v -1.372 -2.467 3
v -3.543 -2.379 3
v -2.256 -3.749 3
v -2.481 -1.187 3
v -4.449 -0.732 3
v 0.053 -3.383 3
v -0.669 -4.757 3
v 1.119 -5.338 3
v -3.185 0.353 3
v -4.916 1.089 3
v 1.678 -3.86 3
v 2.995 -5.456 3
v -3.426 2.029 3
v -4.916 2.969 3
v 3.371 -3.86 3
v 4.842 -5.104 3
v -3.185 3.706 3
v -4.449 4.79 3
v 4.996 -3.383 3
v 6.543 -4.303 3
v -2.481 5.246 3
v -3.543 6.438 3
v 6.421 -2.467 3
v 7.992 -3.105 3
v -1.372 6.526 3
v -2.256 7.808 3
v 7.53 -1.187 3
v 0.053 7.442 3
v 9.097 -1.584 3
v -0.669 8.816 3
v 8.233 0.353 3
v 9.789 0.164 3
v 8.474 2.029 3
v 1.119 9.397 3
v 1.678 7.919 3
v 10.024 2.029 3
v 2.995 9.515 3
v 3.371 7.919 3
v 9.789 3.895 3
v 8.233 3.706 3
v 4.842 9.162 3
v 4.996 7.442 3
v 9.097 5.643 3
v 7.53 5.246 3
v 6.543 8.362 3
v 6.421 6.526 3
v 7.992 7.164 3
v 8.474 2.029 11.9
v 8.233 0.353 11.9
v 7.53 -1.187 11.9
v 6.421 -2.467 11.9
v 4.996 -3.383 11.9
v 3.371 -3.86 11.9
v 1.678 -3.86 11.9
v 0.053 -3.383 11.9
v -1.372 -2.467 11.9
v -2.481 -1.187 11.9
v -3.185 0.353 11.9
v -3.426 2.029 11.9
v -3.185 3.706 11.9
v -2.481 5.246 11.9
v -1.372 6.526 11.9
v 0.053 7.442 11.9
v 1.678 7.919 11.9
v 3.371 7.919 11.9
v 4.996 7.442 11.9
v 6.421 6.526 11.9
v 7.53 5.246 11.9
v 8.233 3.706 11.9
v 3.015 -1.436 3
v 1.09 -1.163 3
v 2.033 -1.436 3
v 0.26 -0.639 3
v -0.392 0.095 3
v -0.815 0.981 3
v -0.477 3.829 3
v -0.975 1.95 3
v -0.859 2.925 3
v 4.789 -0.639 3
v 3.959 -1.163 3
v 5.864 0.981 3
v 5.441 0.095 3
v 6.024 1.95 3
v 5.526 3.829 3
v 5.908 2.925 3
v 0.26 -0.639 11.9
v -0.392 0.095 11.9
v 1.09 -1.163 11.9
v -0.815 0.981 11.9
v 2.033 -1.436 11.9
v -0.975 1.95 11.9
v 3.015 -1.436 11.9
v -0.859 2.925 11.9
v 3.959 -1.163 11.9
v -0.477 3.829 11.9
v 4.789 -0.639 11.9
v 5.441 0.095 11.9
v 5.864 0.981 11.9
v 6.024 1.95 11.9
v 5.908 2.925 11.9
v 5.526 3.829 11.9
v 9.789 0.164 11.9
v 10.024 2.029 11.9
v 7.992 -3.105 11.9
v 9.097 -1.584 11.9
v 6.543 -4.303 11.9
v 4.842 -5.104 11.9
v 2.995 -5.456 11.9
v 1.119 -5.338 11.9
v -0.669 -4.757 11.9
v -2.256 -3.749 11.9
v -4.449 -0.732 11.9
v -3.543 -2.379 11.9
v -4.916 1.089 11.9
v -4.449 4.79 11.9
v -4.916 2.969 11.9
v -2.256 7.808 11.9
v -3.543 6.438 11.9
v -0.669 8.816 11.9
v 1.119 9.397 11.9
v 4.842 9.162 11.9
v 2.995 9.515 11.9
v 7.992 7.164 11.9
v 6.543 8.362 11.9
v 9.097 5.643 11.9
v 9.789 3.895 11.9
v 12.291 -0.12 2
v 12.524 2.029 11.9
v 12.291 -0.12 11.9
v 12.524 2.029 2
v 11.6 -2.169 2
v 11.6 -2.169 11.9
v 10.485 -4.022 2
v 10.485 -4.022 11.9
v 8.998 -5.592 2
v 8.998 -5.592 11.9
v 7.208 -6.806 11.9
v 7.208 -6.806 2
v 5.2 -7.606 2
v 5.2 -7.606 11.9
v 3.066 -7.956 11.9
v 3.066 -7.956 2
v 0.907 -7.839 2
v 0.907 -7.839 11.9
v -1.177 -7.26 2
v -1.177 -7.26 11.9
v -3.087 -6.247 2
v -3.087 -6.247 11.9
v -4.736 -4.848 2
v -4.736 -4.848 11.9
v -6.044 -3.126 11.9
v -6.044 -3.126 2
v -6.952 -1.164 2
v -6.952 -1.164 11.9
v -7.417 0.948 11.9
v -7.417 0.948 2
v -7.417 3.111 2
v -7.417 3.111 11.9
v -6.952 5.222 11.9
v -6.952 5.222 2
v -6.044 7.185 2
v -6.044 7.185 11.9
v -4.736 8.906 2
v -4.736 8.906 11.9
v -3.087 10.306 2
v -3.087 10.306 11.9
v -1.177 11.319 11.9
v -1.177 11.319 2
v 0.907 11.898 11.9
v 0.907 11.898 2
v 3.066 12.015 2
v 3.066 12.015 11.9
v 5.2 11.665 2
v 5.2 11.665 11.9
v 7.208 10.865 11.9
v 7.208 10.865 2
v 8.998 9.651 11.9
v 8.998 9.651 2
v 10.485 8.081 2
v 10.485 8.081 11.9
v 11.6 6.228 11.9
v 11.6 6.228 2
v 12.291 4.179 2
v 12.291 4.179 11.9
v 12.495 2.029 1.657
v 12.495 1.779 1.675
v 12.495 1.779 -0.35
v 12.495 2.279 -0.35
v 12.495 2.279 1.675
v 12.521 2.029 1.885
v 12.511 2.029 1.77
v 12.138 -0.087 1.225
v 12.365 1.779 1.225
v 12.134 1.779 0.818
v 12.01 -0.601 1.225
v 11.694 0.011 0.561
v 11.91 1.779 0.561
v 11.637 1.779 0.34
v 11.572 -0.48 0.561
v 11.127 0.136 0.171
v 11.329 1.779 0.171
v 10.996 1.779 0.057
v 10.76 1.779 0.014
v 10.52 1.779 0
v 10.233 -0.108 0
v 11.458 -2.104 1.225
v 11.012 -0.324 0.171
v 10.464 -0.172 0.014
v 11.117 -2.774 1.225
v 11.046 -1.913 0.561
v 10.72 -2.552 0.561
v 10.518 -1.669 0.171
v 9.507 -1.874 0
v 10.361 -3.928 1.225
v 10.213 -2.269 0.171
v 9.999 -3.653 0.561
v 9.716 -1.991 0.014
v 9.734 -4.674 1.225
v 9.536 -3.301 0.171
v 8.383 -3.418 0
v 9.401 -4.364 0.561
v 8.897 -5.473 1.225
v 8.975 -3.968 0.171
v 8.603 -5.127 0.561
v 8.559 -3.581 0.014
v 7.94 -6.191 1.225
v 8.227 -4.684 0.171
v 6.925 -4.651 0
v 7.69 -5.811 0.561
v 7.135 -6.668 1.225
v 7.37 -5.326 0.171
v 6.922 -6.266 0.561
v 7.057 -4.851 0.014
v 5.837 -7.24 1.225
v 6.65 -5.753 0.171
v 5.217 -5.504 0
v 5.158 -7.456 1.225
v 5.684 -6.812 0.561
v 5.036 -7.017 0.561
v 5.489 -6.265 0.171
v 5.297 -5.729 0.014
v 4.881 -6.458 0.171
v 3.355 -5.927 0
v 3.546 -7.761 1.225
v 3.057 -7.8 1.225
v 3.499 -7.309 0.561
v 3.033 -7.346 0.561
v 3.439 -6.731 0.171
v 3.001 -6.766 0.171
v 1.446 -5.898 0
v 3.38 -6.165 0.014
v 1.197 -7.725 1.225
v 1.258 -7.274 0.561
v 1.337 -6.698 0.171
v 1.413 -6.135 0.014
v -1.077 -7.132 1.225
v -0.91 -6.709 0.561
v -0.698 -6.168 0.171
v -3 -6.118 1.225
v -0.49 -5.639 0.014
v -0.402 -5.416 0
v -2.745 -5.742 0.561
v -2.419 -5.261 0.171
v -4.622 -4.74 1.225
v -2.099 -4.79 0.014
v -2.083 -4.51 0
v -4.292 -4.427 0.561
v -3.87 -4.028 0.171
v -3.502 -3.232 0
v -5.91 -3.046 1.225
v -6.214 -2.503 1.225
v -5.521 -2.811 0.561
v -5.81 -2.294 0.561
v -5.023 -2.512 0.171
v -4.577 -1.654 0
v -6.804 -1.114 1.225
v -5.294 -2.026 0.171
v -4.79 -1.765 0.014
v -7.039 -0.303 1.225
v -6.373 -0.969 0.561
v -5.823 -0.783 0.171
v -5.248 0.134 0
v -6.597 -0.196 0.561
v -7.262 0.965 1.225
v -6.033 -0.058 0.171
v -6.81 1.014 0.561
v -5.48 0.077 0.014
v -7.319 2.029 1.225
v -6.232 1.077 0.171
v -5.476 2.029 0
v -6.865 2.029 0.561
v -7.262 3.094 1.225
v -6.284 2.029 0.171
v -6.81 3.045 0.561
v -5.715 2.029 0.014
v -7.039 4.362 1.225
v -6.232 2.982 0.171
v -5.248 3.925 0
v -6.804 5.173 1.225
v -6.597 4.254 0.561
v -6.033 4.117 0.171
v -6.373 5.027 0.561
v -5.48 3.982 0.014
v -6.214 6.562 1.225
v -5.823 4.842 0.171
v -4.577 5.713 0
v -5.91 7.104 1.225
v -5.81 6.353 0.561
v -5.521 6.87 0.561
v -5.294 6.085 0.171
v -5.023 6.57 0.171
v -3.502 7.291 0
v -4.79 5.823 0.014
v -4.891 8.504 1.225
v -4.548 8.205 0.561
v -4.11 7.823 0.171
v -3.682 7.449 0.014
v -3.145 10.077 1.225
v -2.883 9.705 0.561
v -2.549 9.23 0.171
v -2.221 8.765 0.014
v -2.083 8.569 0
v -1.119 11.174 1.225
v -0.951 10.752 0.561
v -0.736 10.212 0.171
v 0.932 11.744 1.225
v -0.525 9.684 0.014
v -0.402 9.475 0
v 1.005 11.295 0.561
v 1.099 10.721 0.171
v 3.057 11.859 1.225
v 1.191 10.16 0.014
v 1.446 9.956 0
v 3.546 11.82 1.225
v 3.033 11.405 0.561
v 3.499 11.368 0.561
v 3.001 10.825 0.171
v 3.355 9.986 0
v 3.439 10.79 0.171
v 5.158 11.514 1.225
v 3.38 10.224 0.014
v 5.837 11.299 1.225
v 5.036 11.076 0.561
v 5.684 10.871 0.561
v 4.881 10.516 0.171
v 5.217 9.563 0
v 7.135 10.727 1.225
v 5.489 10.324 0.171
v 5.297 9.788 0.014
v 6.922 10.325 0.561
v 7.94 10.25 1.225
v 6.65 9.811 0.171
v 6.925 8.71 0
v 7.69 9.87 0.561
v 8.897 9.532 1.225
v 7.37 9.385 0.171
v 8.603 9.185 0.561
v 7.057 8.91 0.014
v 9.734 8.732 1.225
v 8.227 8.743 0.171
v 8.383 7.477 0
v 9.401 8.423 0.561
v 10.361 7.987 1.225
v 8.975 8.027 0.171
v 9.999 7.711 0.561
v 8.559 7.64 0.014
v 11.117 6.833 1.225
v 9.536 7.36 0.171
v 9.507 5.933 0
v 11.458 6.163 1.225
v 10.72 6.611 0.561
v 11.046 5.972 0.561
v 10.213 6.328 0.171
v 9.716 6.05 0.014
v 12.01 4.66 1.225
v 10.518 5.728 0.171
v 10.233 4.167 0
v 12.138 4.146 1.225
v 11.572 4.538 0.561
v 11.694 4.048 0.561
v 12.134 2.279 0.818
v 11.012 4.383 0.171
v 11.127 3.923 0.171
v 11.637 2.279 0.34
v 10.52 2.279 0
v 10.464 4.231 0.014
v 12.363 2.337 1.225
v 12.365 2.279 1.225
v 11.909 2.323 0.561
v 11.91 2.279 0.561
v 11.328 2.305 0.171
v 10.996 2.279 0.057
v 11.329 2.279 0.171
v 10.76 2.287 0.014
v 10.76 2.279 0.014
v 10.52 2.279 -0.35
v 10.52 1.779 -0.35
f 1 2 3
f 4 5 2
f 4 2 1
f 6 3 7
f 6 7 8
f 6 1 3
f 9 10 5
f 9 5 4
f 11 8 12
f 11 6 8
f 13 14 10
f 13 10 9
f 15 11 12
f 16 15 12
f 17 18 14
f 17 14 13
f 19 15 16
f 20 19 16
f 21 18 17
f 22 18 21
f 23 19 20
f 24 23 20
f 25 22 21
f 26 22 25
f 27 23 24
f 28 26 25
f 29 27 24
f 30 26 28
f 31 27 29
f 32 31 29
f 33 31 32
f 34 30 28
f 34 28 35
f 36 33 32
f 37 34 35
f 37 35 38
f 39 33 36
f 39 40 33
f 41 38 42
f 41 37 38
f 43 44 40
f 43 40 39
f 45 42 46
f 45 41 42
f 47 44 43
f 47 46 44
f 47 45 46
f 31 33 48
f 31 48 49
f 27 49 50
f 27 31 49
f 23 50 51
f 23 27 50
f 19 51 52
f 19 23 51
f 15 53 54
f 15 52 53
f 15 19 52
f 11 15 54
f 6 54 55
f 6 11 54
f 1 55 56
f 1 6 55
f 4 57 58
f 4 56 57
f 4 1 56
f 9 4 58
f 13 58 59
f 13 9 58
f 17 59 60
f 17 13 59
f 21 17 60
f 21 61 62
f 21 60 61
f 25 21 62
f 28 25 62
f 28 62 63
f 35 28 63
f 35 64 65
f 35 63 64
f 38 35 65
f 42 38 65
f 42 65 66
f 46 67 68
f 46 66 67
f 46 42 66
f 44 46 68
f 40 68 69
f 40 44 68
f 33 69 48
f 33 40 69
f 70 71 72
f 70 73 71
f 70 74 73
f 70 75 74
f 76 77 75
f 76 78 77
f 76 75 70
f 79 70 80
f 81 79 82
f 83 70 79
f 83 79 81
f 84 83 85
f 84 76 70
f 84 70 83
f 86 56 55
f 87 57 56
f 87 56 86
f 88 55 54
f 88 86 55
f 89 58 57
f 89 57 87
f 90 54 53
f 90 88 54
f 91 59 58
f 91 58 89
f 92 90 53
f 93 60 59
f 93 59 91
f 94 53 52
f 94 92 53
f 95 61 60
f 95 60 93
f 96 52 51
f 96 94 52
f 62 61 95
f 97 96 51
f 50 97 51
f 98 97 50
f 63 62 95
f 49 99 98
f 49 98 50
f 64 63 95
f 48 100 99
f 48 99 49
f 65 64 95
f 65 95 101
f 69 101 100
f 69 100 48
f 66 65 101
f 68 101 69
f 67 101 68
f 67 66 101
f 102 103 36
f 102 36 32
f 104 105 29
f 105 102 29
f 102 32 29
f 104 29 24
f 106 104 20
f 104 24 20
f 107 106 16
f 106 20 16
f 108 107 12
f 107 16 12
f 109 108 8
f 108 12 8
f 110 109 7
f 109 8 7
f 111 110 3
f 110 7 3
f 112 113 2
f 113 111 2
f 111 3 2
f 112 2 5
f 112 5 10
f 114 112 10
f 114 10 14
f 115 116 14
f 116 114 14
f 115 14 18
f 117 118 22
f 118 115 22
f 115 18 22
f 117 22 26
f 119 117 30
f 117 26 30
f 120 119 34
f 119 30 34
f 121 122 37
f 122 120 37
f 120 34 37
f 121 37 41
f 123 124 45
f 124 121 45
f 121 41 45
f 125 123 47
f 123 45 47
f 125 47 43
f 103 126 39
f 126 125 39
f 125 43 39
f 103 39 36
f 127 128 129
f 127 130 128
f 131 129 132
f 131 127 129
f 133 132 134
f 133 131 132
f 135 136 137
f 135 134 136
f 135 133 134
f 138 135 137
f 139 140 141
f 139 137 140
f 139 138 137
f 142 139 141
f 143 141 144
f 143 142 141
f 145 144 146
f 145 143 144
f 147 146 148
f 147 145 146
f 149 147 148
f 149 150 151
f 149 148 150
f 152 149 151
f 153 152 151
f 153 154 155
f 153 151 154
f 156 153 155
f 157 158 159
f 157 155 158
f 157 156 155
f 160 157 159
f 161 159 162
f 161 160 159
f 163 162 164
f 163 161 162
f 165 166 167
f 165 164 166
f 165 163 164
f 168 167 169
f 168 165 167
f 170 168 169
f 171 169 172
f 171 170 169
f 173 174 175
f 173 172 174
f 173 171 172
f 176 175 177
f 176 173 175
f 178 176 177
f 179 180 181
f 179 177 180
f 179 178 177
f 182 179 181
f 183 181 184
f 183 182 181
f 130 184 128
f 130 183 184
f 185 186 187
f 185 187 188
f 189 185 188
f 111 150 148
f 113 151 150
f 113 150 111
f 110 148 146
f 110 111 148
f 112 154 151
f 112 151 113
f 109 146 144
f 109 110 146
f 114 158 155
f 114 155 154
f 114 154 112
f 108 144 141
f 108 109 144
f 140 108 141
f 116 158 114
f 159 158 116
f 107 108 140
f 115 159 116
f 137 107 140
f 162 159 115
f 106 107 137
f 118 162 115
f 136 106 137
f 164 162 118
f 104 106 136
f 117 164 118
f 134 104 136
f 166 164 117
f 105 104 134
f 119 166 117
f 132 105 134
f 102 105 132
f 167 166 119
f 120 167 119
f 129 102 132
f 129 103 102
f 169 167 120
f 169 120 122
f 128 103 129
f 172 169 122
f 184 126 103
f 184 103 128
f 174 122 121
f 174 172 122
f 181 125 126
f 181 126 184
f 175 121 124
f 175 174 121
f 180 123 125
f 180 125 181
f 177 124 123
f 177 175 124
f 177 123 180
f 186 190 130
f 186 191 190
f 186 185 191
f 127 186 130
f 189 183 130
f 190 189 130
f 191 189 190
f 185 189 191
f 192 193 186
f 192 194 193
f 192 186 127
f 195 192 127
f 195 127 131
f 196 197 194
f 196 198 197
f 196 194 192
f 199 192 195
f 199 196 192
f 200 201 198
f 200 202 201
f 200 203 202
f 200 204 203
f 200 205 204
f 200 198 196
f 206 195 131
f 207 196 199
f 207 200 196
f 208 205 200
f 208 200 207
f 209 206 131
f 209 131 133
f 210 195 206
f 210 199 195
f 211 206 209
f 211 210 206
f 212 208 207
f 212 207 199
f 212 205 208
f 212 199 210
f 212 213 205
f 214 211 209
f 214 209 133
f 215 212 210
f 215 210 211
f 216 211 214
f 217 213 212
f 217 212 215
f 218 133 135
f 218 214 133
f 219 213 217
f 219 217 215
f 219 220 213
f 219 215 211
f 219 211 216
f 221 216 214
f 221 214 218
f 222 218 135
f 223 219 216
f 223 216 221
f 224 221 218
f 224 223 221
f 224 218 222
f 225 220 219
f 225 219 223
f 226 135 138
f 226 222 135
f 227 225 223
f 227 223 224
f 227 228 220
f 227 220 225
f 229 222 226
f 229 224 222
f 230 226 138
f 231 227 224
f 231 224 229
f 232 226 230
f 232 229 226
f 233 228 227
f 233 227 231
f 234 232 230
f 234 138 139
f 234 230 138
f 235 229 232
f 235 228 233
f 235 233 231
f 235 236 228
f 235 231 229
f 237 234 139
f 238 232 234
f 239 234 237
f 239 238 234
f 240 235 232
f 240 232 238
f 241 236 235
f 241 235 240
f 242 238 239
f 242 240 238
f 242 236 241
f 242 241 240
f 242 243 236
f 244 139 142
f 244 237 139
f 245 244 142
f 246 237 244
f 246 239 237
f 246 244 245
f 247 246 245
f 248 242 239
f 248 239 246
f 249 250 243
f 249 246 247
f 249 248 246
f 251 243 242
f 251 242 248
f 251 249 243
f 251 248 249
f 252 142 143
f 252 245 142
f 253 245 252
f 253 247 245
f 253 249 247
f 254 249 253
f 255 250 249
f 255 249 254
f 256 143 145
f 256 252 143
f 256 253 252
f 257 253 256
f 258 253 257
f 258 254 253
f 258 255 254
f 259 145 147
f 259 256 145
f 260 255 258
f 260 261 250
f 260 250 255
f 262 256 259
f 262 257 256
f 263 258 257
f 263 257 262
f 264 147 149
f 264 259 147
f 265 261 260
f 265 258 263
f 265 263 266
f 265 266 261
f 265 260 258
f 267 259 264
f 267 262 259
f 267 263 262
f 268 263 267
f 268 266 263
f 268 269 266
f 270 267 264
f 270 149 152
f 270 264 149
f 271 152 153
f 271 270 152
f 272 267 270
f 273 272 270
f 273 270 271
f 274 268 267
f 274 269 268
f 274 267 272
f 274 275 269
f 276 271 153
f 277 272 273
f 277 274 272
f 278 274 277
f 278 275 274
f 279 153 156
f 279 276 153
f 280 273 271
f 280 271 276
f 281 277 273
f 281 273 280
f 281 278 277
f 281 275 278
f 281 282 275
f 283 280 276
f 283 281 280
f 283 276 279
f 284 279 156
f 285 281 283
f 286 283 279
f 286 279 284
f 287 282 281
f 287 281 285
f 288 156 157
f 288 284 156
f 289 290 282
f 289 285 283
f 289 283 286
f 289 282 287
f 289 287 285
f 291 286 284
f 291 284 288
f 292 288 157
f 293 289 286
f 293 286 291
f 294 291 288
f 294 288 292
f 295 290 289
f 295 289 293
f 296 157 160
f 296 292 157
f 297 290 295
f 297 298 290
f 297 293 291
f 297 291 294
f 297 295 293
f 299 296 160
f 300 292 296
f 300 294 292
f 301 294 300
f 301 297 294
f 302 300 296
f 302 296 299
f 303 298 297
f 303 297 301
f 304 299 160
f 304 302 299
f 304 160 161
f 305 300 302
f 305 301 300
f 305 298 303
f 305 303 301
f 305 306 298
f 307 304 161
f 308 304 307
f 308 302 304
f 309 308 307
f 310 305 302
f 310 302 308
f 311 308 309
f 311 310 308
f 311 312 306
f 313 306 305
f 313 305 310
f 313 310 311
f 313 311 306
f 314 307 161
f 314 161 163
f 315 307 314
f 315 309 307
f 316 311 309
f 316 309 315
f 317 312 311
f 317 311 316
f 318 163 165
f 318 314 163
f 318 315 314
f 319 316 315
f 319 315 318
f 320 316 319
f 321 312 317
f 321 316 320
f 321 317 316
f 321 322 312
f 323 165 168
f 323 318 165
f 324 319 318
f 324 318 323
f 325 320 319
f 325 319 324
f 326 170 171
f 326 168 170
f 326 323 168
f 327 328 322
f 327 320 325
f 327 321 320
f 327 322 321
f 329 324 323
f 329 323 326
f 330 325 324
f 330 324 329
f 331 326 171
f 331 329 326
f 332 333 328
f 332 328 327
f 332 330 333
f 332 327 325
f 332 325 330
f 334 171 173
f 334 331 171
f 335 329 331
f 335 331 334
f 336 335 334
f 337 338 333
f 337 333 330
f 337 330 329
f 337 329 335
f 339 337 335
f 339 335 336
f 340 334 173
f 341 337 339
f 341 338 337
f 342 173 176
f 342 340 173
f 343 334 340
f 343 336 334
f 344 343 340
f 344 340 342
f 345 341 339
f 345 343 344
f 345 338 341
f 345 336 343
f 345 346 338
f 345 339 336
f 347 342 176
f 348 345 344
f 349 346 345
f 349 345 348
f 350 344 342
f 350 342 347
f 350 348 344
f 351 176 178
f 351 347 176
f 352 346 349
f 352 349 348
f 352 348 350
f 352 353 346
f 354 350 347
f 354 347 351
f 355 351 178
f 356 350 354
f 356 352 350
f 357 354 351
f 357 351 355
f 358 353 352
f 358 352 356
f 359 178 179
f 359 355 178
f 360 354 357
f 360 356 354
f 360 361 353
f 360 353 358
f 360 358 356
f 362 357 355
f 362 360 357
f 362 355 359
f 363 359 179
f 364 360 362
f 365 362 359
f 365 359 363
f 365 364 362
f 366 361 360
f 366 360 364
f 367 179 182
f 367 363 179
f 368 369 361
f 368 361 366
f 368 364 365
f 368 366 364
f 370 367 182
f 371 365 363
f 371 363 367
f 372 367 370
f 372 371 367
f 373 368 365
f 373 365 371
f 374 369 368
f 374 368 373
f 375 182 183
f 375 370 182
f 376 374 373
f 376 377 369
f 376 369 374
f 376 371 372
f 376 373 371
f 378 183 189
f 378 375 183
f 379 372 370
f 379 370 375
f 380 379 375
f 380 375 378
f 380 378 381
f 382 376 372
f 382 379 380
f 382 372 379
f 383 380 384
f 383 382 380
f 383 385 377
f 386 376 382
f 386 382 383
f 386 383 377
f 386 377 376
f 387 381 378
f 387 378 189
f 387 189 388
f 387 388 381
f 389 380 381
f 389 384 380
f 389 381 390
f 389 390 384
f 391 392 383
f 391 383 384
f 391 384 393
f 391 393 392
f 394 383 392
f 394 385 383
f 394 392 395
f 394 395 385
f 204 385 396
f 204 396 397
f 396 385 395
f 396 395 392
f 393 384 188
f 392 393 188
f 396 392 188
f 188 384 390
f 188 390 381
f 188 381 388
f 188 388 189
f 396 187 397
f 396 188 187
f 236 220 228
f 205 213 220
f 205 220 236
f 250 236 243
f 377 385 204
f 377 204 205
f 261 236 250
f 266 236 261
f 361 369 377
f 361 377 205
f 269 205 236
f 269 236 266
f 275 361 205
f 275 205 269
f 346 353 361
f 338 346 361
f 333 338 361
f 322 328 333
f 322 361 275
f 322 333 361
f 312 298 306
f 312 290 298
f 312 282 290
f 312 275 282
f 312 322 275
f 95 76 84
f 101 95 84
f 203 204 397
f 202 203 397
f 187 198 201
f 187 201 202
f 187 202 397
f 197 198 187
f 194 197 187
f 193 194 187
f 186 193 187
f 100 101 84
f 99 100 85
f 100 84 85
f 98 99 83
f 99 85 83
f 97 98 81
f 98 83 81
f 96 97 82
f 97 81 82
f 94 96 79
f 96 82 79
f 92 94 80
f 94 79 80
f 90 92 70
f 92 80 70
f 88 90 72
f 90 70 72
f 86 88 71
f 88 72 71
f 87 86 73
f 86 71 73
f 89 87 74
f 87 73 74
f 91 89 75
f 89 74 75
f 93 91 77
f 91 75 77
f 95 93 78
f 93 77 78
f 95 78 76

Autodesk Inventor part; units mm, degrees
ref_plane "YZ Plane" through (0, 0, 0) normal (1, 0, 0) x (0, 1, 0)
ref_plane "XZ Plane" through (0, 0, 0) normal (0, 1, 0) x (-1, 0, 0)
ref_plane "XY Plane" through (0, 0, 0) normal (0, 0, 1) x (1, 0, 0)
sketch "Sketch1" plane through (0, 0, 0) normal (0, 0, 1) x (1, 0, 0)
  circle A0 centre (2.5244, 2.0294) radius 10
  point P0 (0, 0)
  dimension "d0" = 20
extrude "Extrusion1" add sketch "Sketch1" along normal blind 3
sketch "Sketch2" plane through (2.5244, 2.0294, 3) normal (0, 0, 1) x (1, 0, 0)
  circle A0 centre (0, 0) radius 10 projected
  circle A1 centre (0, 0) radius 7.5
  point P0 (-2.5244, -2.0294)
  dimension "d3" = 15
extrude "Extrusion2" add sketch "Sketch2" along normal blind 6.9
sketch "Sketch3" plane through (2.5244, 2.0294, 3) normal (0, 0, 1) x (1, 0, 0)
  circle A0 centre (0, 0) radius 7.5 projected
  circle A1 centre (0, 0) radius 5.95
  arc A2 (-3.0017, 1.8) -> (3.0017, 1.8) centre (0, 0) ccw
  line L0 (0, 1.8) -> (3.0017, 1.8)
  line L1 (0, 1.8) -> (-3.0017, 1.8)
  line L2 (0, 1.8) -> (0, -3.5)
  point P0 (-2.5244, -2.0294)
  dimension "d6" = 11.9
  dimension "d7" = 7
  dimension "d18" = 5.3
extrude "Extrusion3" add sketch "Sketch3" along normal blind 6.9 contours A1
fillet "Fillet1" radius 2 1 edges at (-7.4756, 2.0294, 0)
sketch "Sketch4" plane through (2.5244, 2.0294, 0) normal (0, 0, -1) x (-1, 0, 0)
  circle A0 centre (0, 0) radius 8 projected
  line L0 (-8, 0) -> (-7.9961, 0.25)
  line L1 (-7.9961, 0.25) -> (-7.9961, -0.25)
  line L2 (-7.9961, -0.25) -> (-9.9703, -0.25)
  line L3 (-9.9703, -0.25) -> (-9.9703, 0.25)
  line L4 (-9.9703, 0.25) -> (-7.9961, 0.25)
  point P0 (2.5244, -2.0294)
  dimension "d12" = 0.25
  dimension "d13" = 0.5
extrude "Extrusion4" add sketch "Sketch4" against normal blind 1.85 contours A0 L2 L3 L4
sketch "Sketch5" plane through (0, 0, 0) normal (0, 0, -1) x (-1, 0, 0)
  line L0 (-10.5205, 2.2794) -> (-12.4947, 2.2794) projected
  line L1 (-12.4947, 2.2794) -> (-10.5205, 2.2794)
  line L2 (-10.5205, 2.2794) -> (-10.5205, 1.7794)
  line L3 (-10.5205, 1.7794) -> (-12.4947, 1.7794)
  line L4 (-12.4947, 1.7794) -> (-12.4947, 2.2794)
  point P0 (0, 0)
extrude "Extrusion5" add sketch "Sketch5" along normal blind 0.35
sketch "Sketch7" plane through (2.5244, 2.0294, 9.9) normal (0, 0, 1) x (1, 0, 0)
  arc A0 (-3.0017, 1.8) -> (3.0017, 1.8) centre (0, 0) ccw projected
  line L0 (-3.0017, 1.8) -> (3.0017, 1.8) projected
  circle A1 centre (0, 0) radius 5.95 projected
  line L1 (3.0017, 1.8) -> (3.0017, 3.9445)
  point P0 (-2.5244, -2.0294)
extrude "Extrusion6" add sketch "Sketch7" along normal blind 2
sketch "Sketch8" plane through (2.5244, 2.0294, 9.9) normal (0, 0, 1) x (1, 0, 0)
  circle A0 centre (0, 0) radius 7.5 projected
  circle A1 centre (0, 0) radius 10 projected
  circle A2 centre (0, 0) radius 7.5
  circle A3 centre (0, 0) radius 10
  point P0 (-2.5244, -2.0294)
extrude "Extrusion7" add sketch "Sketch8" along normal blind 2
properties part number "knob"
